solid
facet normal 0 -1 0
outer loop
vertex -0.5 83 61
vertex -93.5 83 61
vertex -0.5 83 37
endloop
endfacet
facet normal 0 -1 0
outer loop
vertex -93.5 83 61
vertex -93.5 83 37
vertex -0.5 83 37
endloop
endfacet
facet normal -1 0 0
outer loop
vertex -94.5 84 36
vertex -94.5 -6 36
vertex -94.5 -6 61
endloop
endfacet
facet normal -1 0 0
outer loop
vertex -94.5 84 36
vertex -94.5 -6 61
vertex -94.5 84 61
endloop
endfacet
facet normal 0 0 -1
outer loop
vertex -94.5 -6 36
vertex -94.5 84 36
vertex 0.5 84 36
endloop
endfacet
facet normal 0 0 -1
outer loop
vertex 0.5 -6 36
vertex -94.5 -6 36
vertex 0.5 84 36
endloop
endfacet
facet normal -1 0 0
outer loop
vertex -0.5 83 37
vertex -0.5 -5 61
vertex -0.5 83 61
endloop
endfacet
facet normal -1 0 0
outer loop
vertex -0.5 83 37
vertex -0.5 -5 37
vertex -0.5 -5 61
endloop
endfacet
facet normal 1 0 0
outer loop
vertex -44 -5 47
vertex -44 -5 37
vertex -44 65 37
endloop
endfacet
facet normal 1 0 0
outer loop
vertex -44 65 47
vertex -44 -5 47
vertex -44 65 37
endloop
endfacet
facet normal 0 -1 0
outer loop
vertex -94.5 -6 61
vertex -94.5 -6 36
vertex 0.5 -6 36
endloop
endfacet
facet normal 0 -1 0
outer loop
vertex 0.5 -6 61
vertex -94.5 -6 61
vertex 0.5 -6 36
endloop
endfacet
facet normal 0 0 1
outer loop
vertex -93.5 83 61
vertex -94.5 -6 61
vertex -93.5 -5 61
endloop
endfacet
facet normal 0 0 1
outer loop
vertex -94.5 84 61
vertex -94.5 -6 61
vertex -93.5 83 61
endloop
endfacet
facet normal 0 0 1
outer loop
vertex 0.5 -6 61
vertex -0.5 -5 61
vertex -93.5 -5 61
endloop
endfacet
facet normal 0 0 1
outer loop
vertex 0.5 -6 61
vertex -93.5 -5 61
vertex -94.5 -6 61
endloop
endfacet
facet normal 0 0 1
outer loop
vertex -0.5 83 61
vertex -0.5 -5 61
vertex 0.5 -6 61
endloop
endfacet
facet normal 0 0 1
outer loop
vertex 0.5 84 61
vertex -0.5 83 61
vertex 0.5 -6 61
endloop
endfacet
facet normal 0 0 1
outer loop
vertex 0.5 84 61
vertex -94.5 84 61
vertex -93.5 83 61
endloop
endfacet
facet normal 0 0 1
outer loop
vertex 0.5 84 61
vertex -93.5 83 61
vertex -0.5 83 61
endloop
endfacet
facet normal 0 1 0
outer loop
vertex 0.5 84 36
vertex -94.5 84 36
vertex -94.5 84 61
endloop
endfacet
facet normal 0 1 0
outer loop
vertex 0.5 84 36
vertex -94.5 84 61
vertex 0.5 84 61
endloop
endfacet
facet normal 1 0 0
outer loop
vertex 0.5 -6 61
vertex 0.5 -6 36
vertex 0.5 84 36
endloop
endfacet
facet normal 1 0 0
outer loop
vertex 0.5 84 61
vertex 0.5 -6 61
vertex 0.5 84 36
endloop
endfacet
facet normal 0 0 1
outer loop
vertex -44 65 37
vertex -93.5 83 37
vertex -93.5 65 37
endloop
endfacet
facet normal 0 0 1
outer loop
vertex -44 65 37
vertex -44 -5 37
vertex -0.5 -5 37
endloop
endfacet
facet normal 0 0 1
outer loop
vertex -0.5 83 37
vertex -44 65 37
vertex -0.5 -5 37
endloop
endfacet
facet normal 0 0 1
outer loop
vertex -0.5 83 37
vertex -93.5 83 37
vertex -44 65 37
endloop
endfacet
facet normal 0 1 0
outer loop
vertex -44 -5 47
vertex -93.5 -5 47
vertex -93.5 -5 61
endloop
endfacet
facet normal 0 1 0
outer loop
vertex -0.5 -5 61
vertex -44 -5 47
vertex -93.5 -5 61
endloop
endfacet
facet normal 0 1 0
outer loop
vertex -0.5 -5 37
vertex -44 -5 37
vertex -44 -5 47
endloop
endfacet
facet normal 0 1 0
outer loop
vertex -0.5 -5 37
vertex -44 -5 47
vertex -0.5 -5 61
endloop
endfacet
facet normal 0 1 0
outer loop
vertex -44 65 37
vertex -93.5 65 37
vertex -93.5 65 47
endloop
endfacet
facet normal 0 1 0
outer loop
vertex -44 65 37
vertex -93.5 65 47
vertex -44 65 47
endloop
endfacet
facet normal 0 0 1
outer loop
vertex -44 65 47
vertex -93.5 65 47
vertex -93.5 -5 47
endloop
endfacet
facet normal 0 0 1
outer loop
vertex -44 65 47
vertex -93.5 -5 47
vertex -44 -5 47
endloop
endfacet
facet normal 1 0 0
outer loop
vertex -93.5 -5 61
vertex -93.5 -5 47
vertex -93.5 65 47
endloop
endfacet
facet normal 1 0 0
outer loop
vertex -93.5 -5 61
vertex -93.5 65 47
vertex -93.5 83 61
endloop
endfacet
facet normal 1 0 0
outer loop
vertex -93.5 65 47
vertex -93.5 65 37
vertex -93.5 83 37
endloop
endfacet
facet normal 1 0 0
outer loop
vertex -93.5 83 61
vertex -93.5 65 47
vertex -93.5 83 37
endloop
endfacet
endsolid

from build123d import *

# Parameters (mm, degrees)
SKETCH017_W    = 95
SKETCH017_H    = 90
PAD010_DEPTH   = 25
THICKNESS001_T = -1
SKETCH021_W    = 50
SKETCH021_H    = 70
PAD013_DEPTH   = 10


with BuildPart() as part:
    # Sketch017 → Pad010 (new body)
    with BuildSketch(Plane.XY):
        Rectangle(SKETCH017_W, SKETCH017_H)
    extrude(amount=PAD010_DEPTH)

    # Thickness001
    thickness001_openings = [part.faces().sort_by_distance(p)[0] for p in [
        (0, 0, 25),
    ]]
    offset(amount=THICKNESS001_T, openings=thickness001_openings)

    # Sketch021 (on DatumPlane) → Pad013 (join)
    with BuildSketch(Plane.XY.offset(1)):
        with Locations((-22, -9)):
            Rectangle(SKETCH021_W, SKETCH021_H)
    extrude(amount=PAD013_DEPTH)


with BuildPart() as part_1:
    # Body005 placement: moved
    add(part.part.moved(Location((-47, 39, 36))))


solid = part_1.part
